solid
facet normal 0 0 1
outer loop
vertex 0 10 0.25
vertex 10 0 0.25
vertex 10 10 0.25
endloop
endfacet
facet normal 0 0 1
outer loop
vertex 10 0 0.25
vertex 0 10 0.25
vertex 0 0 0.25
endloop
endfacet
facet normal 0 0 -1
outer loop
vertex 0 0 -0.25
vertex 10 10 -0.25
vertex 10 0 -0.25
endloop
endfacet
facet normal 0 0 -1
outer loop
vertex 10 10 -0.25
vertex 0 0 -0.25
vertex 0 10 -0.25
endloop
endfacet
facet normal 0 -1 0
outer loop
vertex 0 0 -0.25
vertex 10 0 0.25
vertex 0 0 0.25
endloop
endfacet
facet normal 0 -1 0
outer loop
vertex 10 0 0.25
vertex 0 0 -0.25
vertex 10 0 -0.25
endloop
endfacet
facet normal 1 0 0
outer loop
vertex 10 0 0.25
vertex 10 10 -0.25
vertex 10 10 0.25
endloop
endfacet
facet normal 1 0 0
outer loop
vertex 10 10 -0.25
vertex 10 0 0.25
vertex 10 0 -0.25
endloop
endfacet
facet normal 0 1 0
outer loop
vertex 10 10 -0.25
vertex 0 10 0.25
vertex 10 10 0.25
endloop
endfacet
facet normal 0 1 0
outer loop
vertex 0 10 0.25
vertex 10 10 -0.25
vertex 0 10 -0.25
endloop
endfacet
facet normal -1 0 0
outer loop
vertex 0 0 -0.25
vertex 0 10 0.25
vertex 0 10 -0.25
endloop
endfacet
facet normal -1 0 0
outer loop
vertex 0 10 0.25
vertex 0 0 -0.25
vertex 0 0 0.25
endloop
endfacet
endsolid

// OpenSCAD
module makeFloor(cube_size) {
    translate([cube_size / 2, cube_size / 2, 0])
    cube([cube_size, cube_size, 0.5], center = true);
}
makeFloor(10);
